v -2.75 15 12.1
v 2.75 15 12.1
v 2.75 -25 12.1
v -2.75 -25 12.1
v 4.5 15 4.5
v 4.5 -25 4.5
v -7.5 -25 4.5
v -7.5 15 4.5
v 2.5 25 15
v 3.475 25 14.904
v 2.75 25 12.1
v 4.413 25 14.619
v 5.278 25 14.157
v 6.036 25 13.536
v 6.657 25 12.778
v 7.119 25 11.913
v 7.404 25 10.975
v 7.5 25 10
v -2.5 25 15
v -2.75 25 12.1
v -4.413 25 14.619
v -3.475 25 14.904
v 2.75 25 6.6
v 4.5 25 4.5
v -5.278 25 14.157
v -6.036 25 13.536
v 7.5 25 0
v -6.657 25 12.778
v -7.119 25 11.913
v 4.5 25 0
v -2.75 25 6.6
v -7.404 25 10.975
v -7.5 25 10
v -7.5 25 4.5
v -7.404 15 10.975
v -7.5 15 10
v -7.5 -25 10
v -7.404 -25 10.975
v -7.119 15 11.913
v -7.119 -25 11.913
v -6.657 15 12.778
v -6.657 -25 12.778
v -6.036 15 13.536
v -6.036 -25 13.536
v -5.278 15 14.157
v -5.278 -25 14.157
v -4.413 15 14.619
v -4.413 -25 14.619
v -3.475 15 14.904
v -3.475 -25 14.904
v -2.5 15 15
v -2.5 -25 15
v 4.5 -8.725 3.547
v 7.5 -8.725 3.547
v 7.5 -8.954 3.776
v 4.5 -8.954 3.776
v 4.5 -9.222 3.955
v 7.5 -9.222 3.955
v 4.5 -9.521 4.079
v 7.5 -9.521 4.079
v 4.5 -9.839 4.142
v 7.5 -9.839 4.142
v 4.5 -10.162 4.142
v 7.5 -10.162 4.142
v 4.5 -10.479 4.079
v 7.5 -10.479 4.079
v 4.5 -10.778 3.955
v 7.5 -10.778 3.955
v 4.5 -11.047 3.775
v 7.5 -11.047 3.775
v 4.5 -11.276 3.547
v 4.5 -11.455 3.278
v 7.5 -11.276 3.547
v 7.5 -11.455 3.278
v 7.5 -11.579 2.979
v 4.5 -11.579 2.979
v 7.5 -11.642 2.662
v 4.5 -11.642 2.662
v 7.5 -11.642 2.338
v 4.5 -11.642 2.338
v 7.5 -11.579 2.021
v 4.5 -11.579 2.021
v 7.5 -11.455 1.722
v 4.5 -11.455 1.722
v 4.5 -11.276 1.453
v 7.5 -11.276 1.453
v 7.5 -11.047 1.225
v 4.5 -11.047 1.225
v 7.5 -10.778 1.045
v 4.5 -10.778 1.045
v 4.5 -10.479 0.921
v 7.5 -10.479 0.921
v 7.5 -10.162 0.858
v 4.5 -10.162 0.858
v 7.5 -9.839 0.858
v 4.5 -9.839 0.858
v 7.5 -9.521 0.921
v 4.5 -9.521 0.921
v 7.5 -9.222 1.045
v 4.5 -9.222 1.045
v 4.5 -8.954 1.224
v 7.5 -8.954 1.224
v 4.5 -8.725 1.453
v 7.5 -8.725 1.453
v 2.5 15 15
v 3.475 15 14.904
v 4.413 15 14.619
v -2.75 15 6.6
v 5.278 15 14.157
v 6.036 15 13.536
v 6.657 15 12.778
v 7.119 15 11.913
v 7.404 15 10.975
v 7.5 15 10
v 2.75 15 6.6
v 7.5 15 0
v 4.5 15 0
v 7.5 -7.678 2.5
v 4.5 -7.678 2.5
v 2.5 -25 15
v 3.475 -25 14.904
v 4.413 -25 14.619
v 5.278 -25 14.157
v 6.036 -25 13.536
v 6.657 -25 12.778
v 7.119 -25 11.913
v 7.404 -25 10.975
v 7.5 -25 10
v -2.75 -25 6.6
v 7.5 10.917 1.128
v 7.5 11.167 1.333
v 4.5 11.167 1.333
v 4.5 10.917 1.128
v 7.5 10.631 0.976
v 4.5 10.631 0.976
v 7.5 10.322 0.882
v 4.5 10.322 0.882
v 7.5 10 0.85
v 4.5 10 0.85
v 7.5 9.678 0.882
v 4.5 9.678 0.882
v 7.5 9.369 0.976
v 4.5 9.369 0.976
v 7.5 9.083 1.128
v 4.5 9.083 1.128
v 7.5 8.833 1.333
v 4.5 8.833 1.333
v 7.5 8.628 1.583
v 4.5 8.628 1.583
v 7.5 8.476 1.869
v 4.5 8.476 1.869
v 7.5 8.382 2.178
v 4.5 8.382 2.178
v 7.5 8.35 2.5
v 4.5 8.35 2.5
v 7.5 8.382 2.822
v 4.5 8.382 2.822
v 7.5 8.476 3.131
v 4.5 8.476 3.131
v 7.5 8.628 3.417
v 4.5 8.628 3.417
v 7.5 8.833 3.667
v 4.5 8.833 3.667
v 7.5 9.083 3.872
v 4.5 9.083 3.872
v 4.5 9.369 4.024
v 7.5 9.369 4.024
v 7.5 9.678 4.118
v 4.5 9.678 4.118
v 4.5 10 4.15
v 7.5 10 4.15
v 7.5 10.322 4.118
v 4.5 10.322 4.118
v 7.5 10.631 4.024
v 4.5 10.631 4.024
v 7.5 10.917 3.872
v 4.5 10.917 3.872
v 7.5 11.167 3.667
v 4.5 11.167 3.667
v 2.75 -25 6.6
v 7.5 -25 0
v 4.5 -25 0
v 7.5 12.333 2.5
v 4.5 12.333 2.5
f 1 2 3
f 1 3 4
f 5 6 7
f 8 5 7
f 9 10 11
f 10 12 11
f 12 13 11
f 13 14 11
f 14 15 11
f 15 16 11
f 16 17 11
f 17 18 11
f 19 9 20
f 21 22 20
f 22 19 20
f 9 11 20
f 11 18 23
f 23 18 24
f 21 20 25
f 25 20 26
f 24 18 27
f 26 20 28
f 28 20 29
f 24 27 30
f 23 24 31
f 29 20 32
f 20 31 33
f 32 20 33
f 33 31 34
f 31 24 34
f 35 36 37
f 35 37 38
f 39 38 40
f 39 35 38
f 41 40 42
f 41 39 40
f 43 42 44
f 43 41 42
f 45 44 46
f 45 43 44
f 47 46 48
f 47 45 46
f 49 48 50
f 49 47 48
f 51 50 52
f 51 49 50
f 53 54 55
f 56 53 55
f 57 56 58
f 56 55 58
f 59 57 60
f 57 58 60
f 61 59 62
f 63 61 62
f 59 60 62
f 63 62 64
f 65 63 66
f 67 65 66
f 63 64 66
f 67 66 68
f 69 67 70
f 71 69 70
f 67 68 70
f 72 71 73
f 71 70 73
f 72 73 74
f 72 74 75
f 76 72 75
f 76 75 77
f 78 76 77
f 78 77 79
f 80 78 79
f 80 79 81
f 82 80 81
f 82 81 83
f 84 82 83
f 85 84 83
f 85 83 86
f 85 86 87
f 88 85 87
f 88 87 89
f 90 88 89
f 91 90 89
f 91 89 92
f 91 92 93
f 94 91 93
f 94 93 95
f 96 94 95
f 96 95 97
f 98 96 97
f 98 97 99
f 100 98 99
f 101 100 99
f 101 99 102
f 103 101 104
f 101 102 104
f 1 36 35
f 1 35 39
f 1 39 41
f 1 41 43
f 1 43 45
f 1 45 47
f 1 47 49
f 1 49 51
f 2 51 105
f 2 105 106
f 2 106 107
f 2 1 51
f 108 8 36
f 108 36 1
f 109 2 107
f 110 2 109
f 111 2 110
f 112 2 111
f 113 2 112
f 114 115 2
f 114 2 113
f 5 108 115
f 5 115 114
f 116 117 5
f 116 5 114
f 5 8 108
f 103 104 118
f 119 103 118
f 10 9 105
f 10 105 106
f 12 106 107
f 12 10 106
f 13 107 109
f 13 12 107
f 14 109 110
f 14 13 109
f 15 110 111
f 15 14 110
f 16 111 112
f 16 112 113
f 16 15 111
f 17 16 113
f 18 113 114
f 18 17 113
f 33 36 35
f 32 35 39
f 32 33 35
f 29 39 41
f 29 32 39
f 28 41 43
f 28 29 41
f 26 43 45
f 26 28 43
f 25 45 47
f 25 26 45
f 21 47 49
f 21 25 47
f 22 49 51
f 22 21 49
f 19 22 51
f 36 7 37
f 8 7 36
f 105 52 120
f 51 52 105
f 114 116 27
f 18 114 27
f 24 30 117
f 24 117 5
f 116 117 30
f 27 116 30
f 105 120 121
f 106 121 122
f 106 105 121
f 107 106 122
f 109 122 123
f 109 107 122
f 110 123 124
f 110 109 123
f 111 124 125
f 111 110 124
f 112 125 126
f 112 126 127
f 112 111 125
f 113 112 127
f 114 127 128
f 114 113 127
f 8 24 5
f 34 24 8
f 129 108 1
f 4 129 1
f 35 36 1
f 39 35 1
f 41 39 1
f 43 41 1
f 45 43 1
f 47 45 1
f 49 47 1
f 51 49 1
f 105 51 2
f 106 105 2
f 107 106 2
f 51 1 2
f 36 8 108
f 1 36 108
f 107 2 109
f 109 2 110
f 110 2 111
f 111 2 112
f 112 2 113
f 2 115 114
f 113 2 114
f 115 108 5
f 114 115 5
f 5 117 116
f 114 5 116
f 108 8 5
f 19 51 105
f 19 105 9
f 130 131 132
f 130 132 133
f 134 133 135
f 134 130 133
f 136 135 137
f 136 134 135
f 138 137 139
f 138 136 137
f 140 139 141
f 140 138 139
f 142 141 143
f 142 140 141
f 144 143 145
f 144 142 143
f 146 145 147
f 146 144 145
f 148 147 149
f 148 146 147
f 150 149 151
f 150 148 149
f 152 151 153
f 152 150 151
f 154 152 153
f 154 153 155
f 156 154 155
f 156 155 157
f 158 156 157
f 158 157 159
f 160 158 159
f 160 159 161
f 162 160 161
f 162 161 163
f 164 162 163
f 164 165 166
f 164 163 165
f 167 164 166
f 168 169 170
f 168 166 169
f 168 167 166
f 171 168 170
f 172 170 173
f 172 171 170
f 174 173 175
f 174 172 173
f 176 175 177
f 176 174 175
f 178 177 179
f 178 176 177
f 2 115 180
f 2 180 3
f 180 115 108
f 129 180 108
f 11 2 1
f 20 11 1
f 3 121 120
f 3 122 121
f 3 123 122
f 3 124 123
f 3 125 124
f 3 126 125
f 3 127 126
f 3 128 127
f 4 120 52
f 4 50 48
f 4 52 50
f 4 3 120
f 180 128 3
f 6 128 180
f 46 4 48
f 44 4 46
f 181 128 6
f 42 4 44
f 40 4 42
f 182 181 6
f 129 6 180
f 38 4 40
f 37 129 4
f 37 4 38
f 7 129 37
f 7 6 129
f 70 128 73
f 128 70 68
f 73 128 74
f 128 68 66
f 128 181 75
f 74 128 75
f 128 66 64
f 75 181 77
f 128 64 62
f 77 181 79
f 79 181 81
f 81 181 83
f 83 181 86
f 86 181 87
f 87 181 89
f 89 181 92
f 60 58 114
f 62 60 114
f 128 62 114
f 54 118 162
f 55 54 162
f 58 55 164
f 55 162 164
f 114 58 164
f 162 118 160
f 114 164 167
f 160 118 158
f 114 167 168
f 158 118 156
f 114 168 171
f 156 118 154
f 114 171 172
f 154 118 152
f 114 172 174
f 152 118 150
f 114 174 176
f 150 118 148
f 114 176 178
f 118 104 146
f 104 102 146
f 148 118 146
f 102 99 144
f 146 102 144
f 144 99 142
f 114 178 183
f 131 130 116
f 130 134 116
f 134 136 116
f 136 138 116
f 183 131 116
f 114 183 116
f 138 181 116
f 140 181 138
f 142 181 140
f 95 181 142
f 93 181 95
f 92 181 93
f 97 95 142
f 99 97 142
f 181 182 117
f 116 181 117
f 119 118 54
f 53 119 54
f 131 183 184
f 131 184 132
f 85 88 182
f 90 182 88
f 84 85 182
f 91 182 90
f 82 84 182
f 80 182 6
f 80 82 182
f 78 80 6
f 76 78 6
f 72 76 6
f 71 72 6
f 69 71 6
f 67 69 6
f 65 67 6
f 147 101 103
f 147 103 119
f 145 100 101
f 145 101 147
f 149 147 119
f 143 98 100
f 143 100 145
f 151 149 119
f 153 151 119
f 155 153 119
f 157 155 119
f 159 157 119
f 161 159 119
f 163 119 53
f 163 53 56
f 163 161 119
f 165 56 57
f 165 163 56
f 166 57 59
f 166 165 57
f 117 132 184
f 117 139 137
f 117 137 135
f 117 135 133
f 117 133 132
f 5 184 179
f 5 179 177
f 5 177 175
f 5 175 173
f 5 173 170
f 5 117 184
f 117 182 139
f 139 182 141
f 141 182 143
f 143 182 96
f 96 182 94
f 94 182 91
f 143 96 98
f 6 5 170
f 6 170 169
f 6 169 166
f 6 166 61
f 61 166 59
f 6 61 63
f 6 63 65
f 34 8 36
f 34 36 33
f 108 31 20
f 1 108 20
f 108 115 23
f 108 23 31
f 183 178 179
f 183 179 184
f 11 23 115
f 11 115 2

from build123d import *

# Parameters (mm, degrees)
SKETCH1_W              = 50
SKETCH1_H              = 15
BOSS_EXTRUDE1_DEPTH    = 15
SKETCH2_W              = 5.5
SKETCH2_H              = 5.5
SKETCH2_W_2            = 9
SKETCH2_H_2            = 4.5
CUT_EXTRUDE1_DEPTH     = 53.737557774
CUT_EXTRUDE2_DEPTH     = 33.787192622
FILLET1_R              = 5
SPLIT1_SURFACE_1_BACK  = 55.314
SPLIT1_SURFACE_1_DEPTH = 110.628
SPLIT1_SURFACE_2_BACK  = 55.314
SPLIT1_SURFACE_2_DEPTH = 110.628
SKETCH5_W              = 3
SKETCH5_H              = 4.5
CUT_EXTRUDE3_DEPTH     = 53.737557774


with BuildPart() as part:
    # Sketch1 → Boss-Extrude1 (new body)
    with BuildSketch(Plane(origin=(0, 0, 0), x_dir=(0, 1, 0), z_dir=(0, 0, 1))):
        Rectangle(SKETCH1_W, SKETCH1_H)
    extrude(amount=BOSS_EXTRUDE1_DEPTH)

    # Sketch2 → Cut-Extrude1 (cut, through all)
    with BuildSketch(Plane(origin=(0, 25, 0), x_dir=(-1, 0, 0), z_dir=(0, 1, 0))):
        with Locations((0, 9.35)):
            Rectangle(SKETCH2_W, SKETCH2_H)
        with Locations((0, 2.25)):
            Rectangle(SKETCH2_W_2, SKETCH2_H_2)
    extrude(amount=-CUT_EXTRUDE1_DEPTH, mode=Mode.SUBTRACT)

    # Sketch3 → Cut-Extrude2 (cut, through all)
    with BuildSketch(Plane.YZ.offset(7.5)):
        with BuildLine():
            Line((-7.677732328, 2.5), (-8.724768772, 3.547036444))
            ThreePointArc((-8.724768772, 3.547036444), (-11.65, 2.5), (-8.724768772, 1.452963556))
            Line((-8.724768772, 1.452963556), (-7.677732328, 2.5))
        make_face()
        with BuildLine():
            Line((11.166726189, 3.666726189), (12.333452378, 2.5))
            Line((12.333452378, 2.5), (11.166726189, 1.333273811))
            ThreePointArc((11.166726189, 1.333273811), (8.35, 2.5), (11.166726189, 3.666726189))
        make_face()
    extrude(amount=-CUT_EXTRUDE2_DEPTH, mode=Mode.SUBTRACT)

    # Fillet1
    fillet1_edges = [part.edges().sort_by_distance(p)[0] for p in [
        (7.5, 0, 15),
        (-7.5, 0, 15),
    ]]
    fillet(fillet1_edges, radius=FILLET1_R)


with BuildPart() as body_2:
    # Split1: the piece behind the surface
    add(part.part)
    # Split1 surface: a surface, the sketch's curves swept straight by 110.628 mm
    with BuildLine(Plane.XY.offset(15).offset(-SPLIT1_SURFACE_1_BACK), mode=Mode.PRIVATE) as split1_surface_1_path:
        Line((-7.5, 15), (7.5, 15))
    split1_surface_1 = Shell.extrude(split1_surface_1_path.wire(), (0 * SPLIT1_SURFACE_1_DEPTH, 0 * SPLIT1_SURFACE_1_DEPTH, 1 * SPLIT1_SURFACE_1_DEPTH))
    split(bisect_by=split1_surface_1, keep=Keep.BOTTOM)


with BuildPart() as part_1:
    add(part.part)

    # Split1: split by a surface, the side it looks to stays
    # Split1 surface: a surface, the sketch's curves swept straight by 110.628 mm
    with BuildLine(Plane.XY.offset(15).offset(-SPLIT1_SURFACE_2_BACK), mode=Mode.PRIVATE) as split1_surface_2_path:
        Line((-7.5, 15), (7.5, 15))
    split1_surface_2 = Shell.extrude(split1_surface_2_path.wire(), (0 * SPLIT1_SURFACE_2_DEPTH, 0 * SPLIT1_SURFACE_2_DEPTH, 1 * SPLIT1_SURFACE_2_DEPTH))
    split(bisect_by=split1_surface_2, keep=Keep.TOP)


with BuildPart() as cut_extrude3_tool:
    # Sketch5 → Cut-Extrude3 (new, through all)
    with BuildSketch(Plane(origin=(0, 25, 0), x_dir=(-1, 0, 0), z_dir=(0, 1, 0))):
        with Locations((6, 2.25)):
            Rectangle(SKETCH5_W, SKETCH5_H)
    extrude(amount=-CUT_EXTRUDE3_DEPTH)


with BuildPart() as part_2:
    add(part_1.part)

    # Cut-Extrude3: cut by cut_extrude3_tool
    add(cut_extrude3_tool.part, mode=Mode.SUBTRACT)


with BuildPart() as body_2_1:
    add(body_2.part)

    # Cut-Extrude3: cut by cut_extrude3_tool
    add(cut_extrude3_tool.part, mode=Mode.SUBTRACT)


solid = Compound([part_2.part, body_2_1.part])
